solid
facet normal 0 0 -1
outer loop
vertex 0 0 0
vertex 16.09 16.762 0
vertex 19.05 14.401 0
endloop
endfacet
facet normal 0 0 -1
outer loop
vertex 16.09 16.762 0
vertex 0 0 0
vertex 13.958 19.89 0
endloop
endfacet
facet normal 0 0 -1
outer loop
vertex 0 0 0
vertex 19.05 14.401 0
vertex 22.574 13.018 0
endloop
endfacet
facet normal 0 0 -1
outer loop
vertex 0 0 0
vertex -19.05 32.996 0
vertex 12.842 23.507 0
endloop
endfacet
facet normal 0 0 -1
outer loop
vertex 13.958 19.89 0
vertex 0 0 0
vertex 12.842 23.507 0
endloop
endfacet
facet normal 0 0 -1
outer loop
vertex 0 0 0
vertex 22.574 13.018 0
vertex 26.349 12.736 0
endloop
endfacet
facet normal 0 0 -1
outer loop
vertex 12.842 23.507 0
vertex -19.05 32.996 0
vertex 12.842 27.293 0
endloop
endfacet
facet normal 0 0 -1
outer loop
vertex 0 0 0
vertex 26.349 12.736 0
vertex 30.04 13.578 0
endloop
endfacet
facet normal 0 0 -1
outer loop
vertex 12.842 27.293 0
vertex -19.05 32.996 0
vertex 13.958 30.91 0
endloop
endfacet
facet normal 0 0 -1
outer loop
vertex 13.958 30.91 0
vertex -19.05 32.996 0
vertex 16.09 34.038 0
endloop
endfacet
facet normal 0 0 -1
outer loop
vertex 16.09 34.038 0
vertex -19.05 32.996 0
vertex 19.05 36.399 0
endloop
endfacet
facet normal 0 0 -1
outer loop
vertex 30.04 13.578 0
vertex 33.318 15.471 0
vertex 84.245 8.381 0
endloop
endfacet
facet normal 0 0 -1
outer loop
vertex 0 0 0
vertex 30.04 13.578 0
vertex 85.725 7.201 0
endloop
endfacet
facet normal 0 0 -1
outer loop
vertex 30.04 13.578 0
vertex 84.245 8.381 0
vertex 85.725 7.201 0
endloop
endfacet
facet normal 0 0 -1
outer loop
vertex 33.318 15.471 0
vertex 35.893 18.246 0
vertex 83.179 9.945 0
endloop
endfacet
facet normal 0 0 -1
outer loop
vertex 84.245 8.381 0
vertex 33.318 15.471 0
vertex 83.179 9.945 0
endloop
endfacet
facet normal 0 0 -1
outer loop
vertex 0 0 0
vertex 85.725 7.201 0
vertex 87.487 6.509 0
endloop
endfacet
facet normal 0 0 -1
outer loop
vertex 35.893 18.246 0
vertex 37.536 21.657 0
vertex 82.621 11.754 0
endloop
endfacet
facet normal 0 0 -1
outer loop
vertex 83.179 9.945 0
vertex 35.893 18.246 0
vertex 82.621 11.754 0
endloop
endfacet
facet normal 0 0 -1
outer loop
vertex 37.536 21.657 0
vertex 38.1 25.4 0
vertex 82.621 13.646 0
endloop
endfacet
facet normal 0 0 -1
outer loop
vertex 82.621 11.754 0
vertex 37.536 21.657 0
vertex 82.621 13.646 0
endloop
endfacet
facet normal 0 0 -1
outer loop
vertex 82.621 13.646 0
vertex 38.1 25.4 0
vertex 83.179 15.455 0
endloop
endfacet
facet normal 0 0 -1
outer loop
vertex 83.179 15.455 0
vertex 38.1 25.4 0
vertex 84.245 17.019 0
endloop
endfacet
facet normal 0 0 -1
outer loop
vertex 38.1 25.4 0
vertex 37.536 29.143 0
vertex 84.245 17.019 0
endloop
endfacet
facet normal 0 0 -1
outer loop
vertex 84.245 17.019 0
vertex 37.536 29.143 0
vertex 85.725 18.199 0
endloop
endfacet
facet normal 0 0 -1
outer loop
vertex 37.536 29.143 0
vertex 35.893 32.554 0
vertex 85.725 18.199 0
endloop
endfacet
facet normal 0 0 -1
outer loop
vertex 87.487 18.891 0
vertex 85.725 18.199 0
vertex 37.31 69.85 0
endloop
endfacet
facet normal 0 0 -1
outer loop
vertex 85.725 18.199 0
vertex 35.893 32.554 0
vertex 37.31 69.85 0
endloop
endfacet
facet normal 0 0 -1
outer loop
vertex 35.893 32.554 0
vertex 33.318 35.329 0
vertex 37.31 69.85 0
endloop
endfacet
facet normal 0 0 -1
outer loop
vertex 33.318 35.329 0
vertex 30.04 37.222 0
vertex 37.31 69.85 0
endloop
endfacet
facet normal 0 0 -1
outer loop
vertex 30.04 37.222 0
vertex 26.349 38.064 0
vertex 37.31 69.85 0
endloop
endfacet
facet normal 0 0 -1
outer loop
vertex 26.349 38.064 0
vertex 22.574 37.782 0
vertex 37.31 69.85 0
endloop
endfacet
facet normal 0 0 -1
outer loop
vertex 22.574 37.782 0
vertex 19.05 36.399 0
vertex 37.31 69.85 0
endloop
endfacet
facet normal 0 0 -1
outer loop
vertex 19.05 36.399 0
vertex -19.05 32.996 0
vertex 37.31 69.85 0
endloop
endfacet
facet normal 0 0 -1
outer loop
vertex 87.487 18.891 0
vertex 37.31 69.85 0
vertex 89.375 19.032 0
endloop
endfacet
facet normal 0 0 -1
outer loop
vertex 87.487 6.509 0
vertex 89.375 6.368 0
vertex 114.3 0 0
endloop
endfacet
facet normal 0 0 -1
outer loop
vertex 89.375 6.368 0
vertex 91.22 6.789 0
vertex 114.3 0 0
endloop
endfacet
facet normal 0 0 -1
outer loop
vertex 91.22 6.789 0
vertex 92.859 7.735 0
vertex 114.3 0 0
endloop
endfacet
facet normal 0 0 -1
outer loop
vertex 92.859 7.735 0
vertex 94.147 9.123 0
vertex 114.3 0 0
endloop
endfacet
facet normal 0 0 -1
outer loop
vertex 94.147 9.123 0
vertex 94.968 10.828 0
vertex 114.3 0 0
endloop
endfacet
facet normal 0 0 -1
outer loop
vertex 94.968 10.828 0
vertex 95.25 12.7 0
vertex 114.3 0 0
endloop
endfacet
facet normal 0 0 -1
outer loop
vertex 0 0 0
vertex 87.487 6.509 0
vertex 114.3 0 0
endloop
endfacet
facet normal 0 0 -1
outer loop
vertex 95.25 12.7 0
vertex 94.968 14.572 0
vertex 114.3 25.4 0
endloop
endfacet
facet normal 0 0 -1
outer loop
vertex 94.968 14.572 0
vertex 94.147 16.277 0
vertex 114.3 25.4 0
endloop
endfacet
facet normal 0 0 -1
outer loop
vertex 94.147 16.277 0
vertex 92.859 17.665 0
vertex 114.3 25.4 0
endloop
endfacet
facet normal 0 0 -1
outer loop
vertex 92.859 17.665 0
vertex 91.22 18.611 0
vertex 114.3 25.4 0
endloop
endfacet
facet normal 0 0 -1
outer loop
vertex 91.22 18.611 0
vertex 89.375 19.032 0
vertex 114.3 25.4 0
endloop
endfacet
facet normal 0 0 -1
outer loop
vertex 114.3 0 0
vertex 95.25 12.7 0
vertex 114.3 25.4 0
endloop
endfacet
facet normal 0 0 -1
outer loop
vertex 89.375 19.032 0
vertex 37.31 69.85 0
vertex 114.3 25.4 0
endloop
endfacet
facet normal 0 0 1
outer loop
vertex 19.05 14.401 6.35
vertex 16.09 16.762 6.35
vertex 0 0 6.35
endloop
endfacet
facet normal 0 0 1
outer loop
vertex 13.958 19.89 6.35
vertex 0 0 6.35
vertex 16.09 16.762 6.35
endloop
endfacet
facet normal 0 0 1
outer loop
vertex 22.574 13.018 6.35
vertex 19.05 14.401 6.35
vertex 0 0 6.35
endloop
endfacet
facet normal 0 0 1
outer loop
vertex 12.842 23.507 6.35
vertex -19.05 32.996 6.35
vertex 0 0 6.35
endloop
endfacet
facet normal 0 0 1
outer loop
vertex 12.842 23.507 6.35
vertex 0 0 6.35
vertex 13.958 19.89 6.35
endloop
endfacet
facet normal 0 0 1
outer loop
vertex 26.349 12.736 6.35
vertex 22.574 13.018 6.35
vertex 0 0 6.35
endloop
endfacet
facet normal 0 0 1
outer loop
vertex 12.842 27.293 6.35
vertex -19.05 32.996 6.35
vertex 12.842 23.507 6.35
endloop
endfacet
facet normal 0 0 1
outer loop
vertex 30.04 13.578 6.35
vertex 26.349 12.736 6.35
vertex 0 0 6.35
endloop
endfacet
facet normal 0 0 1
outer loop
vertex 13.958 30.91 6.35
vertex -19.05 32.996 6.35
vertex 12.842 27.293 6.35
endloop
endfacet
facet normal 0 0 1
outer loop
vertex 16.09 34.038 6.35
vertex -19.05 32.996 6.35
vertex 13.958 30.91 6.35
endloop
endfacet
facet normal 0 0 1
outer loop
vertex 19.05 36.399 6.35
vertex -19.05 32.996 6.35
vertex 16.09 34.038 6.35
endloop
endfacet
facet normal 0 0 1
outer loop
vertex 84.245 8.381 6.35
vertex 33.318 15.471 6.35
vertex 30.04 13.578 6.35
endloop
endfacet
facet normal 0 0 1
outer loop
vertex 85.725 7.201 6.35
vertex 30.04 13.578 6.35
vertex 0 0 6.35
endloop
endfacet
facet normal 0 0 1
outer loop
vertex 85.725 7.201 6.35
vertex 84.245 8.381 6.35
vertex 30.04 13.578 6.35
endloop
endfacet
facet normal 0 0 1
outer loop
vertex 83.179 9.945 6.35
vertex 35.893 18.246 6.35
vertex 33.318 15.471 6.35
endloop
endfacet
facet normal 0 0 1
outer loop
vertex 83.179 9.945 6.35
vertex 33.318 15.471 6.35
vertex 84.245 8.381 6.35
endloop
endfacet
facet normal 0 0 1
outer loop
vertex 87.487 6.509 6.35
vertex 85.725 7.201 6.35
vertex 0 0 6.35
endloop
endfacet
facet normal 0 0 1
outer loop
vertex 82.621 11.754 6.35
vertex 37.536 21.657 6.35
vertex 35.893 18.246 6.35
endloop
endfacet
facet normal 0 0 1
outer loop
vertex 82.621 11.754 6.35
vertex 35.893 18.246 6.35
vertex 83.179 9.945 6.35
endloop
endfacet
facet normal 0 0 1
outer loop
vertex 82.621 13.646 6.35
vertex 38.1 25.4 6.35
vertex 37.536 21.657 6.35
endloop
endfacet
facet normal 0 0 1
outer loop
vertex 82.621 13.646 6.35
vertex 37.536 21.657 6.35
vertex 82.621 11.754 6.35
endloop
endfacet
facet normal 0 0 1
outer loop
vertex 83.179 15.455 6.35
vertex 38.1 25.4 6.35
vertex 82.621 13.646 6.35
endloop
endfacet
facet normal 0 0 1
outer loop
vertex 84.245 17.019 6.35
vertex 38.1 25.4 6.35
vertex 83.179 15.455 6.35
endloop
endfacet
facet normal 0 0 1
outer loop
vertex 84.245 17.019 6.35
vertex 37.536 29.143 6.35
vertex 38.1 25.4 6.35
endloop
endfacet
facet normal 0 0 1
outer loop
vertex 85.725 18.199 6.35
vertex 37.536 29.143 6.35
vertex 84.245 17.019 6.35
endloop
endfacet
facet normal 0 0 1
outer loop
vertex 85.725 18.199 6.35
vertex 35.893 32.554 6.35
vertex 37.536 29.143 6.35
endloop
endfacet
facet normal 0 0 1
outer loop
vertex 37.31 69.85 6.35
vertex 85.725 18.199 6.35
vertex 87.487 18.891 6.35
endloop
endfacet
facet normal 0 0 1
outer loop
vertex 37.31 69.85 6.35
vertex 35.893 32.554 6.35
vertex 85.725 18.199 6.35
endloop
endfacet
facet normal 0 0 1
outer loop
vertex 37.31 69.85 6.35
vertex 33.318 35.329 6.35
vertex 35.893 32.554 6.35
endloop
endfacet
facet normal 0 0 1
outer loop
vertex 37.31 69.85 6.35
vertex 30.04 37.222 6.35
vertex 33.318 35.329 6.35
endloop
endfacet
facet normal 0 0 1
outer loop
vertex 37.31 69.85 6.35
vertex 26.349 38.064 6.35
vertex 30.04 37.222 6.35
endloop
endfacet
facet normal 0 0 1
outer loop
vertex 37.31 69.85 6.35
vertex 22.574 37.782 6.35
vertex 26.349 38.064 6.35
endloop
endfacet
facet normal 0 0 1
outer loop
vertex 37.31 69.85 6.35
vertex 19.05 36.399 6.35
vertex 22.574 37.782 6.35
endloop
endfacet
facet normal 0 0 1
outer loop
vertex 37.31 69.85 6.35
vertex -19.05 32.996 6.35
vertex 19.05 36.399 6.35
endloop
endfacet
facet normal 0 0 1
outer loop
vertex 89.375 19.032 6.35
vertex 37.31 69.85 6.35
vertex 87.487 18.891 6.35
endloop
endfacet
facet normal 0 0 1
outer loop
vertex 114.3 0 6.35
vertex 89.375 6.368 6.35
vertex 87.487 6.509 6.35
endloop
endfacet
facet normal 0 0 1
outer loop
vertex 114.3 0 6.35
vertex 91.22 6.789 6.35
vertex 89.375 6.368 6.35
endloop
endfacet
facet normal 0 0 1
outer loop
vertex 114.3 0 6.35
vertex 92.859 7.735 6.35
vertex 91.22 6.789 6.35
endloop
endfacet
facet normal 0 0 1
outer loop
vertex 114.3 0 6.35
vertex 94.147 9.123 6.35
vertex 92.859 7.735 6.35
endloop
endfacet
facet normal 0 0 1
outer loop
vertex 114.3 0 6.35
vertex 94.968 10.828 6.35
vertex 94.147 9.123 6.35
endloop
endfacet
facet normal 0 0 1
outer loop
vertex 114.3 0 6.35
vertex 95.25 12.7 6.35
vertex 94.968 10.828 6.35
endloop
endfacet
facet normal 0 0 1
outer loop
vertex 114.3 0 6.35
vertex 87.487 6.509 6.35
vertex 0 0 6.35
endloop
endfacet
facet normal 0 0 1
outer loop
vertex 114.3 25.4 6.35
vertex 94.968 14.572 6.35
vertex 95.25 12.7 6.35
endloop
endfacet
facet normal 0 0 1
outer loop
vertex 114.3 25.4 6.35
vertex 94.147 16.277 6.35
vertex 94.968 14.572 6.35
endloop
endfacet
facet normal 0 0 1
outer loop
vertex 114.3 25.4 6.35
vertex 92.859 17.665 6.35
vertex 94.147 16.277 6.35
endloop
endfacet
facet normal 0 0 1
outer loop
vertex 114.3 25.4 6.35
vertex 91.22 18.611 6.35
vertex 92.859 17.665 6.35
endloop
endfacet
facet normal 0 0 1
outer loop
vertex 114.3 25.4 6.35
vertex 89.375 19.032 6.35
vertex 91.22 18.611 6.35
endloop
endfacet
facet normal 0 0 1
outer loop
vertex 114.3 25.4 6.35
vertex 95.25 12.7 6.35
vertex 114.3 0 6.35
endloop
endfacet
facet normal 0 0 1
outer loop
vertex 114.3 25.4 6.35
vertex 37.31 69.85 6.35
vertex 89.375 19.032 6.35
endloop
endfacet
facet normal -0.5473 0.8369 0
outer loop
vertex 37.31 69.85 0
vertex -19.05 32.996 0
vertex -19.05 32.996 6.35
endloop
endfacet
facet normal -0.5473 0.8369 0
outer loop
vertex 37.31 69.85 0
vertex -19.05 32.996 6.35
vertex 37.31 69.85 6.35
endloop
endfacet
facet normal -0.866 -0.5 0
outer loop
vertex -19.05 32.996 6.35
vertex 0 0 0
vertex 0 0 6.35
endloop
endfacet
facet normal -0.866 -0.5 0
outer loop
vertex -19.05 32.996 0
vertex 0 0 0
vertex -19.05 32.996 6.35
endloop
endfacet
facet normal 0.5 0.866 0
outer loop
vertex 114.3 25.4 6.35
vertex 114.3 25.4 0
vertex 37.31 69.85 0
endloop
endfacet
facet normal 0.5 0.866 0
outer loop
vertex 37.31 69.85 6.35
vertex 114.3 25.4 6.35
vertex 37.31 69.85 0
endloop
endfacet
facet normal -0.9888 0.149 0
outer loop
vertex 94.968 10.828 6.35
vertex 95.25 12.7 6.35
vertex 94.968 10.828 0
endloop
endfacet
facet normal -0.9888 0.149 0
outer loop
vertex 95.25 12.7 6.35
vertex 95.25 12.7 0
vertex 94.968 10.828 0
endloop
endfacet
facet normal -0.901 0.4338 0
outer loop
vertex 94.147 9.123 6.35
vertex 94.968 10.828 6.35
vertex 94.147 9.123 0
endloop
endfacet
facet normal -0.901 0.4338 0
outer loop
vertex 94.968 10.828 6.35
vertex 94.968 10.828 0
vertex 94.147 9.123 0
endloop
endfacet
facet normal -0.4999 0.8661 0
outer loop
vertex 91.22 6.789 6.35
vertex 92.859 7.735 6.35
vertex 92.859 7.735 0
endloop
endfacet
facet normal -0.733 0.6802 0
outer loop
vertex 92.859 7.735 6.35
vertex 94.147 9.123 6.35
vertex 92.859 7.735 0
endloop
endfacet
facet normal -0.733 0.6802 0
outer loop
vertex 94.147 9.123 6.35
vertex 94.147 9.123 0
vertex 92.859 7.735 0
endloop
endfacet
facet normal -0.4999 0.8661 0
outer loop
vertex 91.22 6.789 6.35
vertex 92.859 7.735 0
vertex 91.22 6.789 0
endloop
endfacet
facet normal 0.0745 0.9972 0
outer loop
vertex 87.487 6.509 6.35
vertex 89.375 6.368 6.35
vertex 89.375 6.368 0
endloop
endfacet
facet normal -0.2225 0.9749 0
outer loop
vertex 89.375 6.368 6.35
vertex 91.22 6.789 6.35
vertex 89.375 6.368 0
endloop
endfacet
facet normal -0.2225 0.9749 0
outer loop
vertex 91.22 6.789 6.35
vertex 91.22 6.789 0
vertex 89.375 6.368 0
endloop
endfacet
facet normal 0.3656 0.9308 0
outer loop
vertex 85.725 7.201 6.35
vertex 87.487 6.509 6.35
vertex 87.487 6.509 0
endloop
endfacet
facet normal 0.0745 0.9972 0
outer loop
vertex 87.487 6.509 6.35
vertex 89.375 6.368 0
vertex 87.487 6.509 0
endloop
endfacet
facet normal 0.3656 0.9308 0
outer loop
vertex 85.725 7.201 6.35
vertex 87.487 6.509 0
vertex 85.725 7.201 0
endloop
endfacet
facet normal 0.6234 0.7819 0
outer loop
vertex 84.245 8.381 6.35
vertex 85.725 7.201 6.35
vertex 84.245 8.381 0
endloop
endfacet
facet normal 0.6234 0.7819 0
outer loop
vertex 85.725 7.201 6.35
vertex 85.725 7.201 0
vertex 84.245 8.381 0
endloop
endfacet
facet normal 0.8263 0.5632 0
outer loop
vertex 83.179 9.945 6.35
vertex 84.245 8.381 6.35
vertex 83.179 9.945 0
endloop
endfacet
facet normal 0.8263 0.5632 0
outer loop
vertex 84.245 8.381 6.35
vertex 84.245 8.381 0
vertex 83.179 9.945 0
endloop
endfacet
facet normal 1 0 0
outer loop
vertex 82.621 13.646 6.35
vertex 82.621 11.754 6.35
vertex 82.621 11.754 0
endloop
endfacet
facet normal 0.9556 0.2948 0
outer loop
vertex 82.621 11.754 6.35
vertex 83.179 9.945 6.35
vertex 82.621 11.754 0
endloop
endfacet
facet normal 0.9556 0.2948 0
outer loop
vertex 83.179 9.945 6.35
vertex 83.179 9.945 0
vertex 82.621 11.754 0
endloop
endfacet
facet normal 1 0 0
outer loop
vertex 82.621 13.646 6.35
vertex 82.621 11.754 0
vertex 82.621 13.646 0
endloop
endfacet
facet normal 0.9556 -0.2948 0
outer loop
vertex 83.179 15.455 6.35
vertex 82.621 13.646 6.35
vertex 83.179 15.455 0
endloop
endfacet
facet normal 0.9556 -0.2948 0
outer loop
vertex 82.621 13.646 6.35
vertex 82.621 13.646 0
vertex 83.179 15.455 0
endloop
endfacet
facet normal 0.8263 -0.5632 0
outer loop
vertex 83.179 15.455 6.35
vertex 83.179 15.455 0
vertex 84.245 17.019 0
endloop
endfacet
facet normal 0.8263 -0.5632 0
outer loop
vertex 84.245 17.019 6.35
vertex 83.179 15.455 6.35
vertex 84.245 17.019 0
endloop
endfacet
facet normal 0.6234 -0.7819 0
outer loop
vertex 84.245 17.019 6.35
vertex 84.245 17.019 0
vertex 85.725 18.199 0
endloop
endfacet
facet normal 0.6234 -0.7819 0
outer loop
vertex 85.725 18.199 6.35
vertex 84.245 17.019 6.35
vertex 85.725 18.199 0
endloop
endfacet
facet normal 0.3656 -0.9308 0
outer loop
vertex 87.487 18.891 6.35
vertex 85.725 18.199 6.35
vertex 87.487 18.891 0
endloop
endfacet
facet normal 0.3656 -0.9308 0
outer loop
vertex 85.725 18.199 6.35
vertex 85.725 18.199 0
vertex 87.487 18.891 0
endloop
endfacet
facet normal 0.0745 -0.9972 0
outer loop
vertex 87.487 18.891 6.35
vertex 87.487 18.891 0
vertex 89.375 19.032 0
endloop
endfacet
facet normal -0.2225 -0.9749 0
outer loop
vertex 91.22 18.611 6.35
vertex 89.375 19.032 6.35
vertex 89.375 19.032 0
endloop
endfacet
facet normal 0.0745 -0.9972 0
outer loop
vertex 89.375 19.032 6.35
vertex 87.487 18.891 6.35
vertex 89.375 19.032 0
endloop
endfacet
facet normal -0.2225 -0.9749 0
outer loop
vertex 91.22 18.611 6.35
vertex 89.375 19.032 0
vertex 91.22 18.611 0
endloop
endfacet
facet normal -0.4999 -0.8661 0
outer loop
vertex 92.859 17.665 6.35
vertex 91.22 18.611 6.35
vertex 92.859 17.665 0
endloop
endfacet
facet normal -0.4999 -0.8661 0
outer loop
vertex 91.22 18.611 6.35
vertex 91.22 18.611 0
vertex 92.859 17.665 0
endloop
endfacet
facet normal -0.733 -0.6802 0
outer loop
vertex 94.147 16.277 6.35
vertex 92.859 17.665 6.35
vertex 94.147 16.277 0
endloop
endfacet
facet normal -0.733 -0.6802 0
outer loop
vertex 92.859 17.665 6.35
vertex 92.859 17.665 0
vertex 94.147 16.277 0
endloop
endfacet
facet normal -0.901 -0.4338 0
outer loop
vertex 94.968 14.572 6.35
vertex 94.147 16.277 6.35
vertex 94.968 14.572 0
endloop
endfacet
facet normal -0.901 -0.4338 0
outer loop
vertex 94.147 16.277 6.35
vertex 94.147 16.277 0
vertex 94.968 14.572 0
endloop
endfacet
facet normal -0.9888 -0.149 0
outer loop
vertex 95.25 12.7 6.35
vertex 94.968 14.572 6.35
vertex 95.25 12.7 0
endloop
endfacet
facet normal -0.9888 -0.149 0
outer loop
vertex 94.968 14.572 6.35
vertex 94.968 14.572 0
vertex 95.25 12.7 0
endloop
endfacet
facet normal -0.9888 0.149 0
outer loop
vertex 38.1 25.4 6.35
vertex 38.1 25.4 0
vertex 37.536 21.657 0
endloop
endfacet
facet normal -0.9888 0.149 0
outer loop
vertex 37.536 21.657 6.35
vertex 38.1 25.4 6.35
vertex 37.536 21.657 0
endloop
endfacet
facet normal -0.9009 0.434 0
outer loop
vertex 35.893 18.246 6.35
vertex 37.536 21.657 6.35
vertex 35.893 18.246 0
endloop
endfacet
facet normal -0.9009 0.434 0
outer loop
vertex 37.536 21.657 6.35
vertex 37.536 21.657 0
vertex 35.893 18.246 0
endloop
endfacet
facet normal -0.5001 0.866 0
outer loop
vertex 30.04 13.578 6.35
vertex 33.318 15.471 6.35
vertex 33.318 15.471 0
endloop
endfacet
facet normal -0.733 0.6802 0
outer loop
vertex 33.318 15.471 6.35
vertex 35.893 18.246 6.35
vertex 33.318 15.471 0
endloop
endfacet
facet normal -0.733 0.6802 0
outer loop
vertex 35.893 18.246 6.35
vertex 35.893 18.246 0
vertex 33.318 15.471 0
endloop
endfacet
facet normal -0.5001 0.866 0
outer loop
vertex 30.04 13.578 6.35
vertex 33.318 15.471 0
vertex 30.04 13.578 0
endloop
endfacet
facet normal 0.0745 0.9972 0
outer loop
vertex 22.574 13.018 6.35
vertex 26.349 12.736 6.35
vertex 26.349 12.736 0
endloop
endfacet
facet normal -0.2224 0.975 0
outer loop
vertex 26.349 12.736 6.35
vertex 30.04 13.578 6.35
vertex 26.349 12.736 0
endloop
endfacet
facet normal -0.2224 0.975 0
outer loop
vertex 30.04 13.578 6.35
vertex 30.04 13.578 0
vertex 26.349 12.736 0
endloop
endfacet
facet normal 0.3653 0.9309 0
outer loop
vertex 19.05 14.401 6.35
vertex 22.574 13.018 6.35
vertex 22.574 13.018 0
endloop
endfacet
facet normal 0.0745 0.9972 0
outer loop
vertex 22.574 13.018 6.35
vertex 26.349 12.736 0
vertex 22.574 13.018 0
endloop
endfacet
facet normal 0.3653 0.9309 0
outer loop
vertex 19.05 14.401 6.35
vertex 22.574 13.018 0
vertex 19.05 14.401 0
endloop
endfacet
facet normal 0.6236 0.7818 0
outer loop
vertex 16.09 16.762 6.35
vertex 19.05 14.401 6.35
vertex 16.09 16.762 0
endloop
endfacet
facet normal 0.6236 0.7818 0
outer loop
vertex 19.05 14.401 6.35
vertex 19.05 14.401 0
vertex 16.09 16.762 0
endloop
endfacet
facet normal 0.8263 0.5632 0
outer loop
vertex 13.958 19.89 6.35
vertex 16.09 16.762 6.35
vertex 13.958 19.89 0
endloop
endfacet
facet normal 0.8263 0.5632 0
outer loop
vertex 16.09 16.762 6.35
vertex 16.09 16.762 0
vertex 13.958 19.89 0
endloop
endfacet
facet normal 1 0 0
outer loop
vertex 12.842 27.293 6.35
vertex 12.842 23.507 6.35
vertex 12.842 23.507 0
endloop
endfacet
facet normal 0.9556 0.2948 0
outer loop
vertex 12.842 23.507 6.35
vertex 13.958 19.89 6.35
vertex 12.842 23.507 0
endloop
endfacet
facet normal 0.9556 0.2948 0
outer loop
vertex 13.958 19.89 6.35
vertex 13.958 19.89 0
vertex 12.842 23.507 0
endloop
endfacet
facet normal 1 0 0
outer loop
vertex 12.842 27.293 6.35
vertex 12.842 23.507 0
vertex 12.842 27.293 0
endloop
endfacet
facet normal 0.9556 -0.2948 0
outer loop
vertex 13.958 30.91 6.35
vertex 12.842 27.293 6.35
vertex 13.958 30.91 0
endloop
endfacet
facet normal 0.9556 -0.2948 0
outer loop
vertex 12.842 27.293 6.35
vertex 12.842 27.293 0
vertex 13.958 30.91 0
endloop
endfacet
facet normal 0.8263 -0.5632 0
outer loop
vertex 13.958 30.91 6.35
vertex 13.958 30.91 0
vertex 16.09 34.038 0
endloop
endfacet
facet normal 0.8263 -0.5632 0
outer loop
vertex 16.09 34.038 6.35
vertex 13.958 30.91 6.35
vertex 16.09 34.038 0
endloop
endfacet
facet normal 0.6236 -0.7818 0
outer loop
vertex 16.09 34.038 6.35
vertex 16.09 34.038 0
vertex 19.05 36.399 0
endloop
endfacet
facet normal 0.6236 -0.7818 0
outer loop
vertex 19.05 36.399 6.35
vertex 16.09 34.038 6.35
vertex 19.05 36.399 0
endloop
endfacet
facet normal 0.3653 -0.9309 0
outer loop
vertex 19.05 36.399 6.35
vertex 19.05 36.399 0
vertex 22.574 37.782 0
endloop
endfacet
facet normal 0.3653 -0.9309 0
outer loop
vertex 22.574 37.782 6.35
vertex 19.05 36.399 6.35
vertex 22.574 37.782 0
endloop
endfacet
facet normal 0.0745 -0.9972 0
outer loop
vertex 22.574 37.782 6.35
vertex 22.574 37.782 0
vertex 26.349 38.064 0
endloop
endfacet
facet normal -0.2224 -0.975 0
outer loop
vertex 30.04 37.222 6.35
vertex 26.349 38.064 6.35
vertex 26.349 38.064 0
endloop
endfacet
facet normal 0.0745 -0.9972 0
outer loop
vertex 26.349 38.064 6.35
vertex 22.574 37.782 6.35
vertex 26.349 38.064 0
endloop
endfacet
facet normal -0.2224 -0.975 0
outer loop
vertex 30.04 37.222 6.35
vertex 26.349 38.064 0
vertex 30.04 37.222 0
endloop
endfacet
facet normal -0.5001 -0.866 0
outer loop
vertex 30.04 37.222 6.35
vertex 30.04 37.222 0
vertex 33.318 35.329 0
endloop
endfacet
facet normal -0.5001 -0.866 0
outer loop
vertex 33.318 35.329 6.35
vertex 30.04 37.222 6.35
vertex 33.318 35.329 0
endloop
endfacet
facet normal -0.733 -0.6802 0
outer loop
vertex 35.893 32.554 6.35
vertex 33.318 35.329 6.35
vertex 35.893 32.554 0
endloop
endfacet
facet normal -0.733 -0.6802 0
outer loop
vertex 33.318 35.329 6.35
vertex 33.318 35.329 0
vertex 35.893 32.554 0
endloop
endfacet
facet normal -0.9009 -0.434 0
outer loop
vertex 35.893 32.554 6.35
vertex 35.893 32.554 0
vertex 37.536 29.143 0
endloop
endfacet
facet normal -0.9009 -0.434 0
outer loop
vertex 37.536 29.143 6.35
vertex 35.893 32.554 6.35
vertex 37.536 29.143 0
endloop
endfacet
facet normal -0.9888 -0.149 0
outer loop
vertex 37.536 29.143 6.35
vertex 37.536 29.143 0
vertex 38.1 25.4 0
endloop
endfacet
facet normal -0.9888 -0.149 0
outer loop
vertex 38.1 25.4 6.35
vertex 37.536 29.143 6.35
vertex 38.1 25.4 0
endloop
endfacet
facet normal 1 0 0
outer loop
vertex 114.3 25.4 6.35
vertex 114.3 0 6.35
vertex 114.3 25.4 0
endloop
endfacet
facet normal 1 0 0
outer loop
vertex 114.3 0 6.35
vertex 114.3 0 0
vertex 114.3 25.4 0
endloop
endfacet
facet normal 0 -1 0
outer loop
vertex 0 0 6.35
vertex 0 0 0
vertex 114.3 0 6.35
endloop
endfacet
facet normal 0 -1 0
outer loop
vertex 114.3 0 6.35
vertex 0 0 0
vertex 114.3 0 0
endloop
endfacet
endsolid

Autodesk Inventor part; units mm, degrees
ref_plane "YZ Plane" through (0, 0, 0) normal (1, 0, 0) x (0, 1, 0)
ref_plane "XZ Plane" through (0, 0, 0) normal (0, 1, 0) x (-1, 0, 0)
ref_plane "XY Plane" through (0, 0, 0) normal (0, 0, 1) x (1, 0, 0)
sketch "Sketch1" plane through (0, 0, 0) normal (0, 0, 1) x (1, 0, 0)
  line L0 (114.3, 0) -> (114.3, 25.4)
  line L1 (114.3, 25.4) -> (37.3103, 69.85)
  line L2 (0, 0) -> (-19.05, 32.9956)
  line L3 (-19.05, 32.9956) -> (37.3103, 69.85)
  circle A0 centre (25.4, 25.4) radius 12.7
  circle A1 centre (88.9, 12.7) radius 6.35
  line L4 (0, 0) -> (114.3, 0)
  dimension "d1" = 25.4
  dimension "d2" = 88.9
  dimension "d4" = 38.1
  dimension "d8" = 25.4
  dimension "d11" = 12.7
extrude "Extrusion1" add sketch "Sketch1" along normal blind 6.35
properties part number "Assignment 1.5 - Slider Block"
